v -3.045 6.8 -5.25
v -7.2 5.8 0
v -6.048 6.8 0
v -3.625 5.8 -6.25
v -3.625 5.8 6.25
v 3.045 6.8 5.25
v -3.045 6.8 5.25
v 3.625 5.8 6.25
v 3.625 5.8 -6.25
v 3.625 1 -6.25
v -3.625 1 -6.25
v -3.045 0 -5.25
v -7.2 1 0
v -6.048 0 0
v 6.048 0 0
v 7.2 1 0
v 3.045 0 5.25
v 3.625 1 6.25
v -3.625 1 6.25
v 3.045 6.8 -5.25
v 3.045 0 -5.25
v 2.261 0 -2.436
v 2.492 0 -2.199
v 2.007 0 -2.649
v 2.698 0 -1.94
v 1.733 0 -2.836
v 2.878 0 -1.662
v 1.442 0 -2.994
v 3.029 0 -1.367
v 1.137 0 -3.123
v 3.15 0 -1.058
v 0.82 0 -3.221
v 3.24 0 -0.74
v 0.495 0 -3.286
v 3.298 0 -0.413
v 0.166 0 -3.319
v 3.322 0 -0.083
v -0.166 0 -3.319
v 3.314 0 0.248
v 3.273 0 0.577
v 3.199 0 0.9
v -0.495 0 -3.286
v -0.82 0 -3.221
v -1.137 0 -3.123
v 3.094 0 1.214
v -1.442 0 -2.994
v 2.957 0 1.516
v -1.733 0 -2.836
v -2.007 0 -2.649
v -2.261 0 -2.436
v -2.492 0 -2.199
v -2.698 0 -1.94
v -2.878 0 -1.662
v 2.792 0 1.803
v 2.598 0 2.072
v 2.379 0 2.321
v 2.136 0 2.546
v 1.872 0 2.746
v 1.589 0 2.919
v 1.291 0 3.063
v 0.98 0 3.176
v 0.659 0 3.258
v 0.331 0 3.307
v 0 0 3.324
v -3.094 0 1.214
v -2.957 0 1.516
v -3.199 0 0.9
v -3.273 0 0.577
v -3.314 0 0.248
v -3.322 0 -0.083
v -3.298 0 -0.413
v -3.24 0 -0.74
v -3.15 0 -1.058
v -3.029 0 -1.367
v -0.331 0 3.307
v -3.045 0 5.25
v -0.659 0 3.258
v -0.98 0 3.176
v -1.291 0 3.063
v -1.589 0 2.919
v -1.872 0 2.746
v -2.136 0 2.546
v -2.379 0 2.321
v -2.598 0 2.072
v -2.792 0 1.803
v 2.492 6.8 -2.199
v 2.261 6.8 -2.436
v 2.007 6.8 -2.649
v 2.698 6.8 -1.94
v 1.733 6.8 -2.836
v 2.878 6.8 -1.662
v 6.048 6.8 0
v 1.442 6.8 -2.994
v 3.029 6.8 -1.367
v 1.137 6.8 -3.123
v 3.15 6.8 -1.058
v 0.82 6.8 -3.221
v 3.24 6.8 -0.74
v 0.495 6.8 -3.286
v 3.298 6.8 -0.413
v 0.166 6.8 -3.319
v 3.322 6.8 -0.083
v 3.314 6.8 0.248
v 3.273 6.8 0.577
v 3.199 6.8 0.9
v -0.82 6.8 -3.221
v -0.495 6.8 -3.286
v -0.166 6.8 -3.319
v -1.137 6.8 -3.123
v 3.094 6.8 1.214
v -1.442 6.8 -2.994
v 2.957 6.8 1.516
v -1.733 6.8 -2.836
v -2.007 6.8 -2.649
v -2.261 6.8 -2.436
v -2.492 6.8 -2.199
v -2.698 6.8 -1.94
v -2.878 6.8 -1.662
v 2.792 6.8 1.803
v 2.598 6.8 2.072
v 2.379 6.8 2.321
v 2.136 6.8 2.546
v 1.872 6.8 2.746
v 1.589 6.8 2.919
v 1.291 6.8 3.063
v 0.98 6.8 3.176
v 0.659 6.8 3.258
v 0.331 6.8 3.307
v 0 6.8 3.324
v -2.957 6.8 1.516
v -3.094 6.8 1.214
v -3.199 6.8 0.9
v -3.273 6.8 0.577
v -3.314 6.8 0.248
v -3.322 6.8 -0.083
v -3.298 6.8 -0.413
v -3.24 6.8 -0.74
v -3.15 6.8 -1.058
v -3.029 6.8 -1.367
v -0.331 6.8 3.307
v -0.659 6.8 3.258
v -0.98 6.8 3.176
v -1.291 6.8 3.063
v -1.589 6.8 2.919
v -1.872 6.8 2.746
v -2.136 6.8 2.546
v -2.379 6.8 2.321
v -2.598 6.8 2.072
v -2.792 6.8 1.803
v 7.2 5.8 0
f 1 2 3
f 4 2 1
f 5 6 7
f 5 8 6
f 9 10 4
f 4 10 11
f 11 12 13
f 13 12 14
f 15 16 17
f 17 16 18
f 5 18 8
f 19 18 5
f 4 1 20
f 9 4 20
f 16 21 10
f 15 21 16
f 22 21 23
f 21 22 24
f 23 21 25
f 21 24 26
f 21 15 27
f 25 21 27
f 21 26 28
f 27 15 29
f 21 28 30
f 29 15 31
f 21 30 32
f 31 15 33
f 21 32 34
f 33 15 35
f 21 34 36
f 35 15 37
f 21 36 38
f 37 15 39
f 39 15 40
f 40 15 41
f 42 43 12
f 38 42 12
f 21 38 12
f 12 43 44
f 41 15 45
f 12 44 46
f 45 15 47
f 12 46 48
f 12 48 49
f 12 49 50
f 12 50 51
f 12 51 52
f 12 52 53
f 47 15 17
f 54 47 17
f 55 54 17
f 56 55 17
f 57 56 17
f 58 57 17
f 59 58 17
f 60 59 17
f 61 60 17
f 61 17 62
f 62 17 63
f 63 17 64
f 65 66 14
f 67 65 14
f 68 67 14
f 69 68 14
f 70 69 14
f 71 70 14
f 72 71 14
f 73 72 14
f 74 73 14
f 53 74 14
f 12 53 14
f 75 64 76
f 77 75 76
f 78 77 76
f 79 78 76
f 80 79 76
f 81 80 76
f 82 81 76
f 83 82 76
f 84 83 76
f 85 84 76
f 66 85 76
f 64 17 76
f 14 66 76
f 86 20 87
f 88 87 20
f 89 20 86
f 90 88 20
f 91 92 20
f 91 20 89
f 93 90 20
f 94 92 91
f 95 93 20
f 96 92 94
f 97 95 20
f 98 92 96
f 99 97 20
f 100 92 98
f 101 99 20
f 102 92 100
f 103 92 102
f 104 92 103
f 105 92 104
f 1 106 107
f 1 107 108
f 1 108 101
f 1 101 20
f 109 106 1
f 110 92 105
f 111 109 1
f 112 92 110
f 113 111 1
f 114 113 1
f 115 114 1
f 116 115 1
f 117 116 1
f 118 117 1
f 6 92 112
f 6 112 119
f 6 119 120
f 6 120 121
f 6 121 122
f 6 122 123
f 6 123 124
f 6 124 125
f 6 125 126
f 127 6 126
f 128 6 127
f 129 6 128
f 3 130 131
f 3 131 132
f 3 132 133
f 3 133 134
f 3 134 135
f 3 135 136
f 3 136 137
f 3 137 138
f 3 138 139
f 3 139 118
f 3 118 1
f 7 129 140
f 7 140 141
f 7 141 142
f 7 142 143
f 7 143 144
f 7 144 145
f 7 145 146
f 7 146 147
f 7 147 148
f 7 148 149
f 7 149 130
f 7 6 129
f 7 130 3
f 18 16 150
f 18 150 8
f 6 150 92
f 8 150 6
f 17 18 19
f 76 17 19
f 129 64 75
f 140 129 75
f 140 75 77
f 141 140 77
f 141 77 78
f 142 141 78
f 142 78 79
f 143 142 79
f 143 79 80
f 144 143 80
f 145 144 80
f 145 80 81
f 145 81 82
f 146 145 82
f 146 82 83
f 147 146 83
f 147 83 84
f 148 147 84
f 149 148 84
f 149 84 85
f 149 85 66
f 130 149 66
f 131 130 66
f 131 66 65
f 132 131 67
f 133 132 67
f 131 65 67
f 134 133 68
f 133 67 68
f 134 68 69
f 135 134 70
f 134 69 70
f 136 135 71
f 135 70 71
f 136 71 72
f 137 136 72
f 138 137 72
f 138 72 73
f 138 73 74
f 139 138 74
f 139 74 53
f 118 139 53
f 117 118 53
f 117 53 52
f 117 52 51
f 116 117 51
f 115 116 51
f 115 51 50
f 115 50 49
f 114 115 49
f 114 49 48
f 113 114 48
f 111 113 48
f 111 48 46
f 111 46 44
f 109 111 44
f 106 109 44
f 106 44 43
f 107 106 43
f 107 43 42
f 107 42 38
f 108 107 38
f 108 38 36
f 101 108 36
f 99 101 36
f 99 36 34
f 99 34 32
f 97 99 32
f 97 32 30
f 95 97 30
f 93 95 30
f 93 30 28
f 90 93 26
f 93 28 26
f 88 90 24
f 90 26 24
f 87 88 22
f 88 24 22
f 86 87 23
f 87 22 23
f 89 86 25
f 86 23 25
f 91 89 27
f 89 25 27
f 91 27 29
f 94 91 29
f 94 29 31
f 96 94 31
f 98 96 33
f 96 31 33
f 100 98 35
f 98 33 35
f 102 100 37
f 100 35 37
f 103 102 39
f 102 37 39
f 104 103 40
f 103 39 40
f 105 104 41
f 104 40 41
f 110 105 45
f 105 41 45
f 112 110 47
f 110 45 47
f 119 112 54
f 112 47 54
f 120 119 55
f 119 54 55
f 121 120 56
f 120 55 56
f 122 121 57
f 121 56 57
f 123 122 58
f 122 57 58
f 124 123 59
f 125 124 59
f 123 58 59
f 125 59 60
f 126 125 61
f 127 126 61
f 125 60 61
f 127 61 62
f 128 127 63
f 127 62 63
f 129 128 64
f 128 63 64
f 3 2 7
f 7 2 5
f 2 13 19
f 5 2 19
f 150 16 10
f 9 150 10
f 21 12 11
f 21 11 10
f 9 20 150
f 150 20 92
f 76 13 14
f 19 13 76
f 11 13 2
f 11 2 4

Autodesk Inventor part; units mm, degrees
ref_plane "YZ Plane" through (0, 0, 0) normal (1, 0, 0) x (0, 1, 0)
ref_plane "XZ Plane" through (0, 0, 0) normal (0, 1, 0) x (-1, 0, 0)
ref_plane "XY Plane" through (0, 0, 0) normal (0, 0, 1) x (1, 0, 0)
sketch "草图1" plane through (0, 0, 0) normal (0, 1, 0) x (-1, 0, 0)
  line L0 (0, 0) -> (7.2, 0)
  line L1 (7.2, 0) -> (3.6254, -6.25)
  line L2 (3.6254, -6.25) -> (0, -6.25)
  line L3 (7.2, 0) -> (3.6254, 6.25)
  line L4 (3.6254, 6.25) -> (0, 6.25)
  line L5 (0, 0) -> (0, -6.25)
  line L6 (-7.2, 0) -> (-3.6254, -6.25)
  line L7 (-3.6254, -6.25) -> (0, -6.25)
  line L8 (-7.2, 0) -> (-3.6254, 6.25)
  line L9 (-3.6254, 6.25) -> (0, 6.25)
  dimension "d2" = 14.4
  dimension "d3" = 12.5
extrude "拉伸1" add sketch "草图1" along normal blind 6.8
sketch "草图2" plane through (0, 6.8, 0) normal (0, 1, 0) x (1, 0, 0)
  circle A0 centre (0, 0) radius 6.25
  dimension "d6" = 12.5
hole "孔1" at (0, 6.8, 0) direction (0, -1, 0) diameter 6.647 end through all thread size "M8x1.25" designation "M8" class "6H" standard "GB Metric profile"
chamfer "倒角3" distance 1 angle 45 12 edges at (0, 6.8, 6.25) (5.4127, 6.8, 3.125) (5.4127, 6.8, -3.125) (0, 6.8, -6.25) (-5.4127, 6.8, -3.125) (-5.4127, 6.8, 3.125) (5.4127, 0, 3.125) (5.4127, 0, -3.125) (0, 0, -6.25) (-5.4127, 0, -3.125) (-5.4127, 0, 3.125) (0, 0, 6.25)
properties part number "6-luomu" material "不锈钢"
